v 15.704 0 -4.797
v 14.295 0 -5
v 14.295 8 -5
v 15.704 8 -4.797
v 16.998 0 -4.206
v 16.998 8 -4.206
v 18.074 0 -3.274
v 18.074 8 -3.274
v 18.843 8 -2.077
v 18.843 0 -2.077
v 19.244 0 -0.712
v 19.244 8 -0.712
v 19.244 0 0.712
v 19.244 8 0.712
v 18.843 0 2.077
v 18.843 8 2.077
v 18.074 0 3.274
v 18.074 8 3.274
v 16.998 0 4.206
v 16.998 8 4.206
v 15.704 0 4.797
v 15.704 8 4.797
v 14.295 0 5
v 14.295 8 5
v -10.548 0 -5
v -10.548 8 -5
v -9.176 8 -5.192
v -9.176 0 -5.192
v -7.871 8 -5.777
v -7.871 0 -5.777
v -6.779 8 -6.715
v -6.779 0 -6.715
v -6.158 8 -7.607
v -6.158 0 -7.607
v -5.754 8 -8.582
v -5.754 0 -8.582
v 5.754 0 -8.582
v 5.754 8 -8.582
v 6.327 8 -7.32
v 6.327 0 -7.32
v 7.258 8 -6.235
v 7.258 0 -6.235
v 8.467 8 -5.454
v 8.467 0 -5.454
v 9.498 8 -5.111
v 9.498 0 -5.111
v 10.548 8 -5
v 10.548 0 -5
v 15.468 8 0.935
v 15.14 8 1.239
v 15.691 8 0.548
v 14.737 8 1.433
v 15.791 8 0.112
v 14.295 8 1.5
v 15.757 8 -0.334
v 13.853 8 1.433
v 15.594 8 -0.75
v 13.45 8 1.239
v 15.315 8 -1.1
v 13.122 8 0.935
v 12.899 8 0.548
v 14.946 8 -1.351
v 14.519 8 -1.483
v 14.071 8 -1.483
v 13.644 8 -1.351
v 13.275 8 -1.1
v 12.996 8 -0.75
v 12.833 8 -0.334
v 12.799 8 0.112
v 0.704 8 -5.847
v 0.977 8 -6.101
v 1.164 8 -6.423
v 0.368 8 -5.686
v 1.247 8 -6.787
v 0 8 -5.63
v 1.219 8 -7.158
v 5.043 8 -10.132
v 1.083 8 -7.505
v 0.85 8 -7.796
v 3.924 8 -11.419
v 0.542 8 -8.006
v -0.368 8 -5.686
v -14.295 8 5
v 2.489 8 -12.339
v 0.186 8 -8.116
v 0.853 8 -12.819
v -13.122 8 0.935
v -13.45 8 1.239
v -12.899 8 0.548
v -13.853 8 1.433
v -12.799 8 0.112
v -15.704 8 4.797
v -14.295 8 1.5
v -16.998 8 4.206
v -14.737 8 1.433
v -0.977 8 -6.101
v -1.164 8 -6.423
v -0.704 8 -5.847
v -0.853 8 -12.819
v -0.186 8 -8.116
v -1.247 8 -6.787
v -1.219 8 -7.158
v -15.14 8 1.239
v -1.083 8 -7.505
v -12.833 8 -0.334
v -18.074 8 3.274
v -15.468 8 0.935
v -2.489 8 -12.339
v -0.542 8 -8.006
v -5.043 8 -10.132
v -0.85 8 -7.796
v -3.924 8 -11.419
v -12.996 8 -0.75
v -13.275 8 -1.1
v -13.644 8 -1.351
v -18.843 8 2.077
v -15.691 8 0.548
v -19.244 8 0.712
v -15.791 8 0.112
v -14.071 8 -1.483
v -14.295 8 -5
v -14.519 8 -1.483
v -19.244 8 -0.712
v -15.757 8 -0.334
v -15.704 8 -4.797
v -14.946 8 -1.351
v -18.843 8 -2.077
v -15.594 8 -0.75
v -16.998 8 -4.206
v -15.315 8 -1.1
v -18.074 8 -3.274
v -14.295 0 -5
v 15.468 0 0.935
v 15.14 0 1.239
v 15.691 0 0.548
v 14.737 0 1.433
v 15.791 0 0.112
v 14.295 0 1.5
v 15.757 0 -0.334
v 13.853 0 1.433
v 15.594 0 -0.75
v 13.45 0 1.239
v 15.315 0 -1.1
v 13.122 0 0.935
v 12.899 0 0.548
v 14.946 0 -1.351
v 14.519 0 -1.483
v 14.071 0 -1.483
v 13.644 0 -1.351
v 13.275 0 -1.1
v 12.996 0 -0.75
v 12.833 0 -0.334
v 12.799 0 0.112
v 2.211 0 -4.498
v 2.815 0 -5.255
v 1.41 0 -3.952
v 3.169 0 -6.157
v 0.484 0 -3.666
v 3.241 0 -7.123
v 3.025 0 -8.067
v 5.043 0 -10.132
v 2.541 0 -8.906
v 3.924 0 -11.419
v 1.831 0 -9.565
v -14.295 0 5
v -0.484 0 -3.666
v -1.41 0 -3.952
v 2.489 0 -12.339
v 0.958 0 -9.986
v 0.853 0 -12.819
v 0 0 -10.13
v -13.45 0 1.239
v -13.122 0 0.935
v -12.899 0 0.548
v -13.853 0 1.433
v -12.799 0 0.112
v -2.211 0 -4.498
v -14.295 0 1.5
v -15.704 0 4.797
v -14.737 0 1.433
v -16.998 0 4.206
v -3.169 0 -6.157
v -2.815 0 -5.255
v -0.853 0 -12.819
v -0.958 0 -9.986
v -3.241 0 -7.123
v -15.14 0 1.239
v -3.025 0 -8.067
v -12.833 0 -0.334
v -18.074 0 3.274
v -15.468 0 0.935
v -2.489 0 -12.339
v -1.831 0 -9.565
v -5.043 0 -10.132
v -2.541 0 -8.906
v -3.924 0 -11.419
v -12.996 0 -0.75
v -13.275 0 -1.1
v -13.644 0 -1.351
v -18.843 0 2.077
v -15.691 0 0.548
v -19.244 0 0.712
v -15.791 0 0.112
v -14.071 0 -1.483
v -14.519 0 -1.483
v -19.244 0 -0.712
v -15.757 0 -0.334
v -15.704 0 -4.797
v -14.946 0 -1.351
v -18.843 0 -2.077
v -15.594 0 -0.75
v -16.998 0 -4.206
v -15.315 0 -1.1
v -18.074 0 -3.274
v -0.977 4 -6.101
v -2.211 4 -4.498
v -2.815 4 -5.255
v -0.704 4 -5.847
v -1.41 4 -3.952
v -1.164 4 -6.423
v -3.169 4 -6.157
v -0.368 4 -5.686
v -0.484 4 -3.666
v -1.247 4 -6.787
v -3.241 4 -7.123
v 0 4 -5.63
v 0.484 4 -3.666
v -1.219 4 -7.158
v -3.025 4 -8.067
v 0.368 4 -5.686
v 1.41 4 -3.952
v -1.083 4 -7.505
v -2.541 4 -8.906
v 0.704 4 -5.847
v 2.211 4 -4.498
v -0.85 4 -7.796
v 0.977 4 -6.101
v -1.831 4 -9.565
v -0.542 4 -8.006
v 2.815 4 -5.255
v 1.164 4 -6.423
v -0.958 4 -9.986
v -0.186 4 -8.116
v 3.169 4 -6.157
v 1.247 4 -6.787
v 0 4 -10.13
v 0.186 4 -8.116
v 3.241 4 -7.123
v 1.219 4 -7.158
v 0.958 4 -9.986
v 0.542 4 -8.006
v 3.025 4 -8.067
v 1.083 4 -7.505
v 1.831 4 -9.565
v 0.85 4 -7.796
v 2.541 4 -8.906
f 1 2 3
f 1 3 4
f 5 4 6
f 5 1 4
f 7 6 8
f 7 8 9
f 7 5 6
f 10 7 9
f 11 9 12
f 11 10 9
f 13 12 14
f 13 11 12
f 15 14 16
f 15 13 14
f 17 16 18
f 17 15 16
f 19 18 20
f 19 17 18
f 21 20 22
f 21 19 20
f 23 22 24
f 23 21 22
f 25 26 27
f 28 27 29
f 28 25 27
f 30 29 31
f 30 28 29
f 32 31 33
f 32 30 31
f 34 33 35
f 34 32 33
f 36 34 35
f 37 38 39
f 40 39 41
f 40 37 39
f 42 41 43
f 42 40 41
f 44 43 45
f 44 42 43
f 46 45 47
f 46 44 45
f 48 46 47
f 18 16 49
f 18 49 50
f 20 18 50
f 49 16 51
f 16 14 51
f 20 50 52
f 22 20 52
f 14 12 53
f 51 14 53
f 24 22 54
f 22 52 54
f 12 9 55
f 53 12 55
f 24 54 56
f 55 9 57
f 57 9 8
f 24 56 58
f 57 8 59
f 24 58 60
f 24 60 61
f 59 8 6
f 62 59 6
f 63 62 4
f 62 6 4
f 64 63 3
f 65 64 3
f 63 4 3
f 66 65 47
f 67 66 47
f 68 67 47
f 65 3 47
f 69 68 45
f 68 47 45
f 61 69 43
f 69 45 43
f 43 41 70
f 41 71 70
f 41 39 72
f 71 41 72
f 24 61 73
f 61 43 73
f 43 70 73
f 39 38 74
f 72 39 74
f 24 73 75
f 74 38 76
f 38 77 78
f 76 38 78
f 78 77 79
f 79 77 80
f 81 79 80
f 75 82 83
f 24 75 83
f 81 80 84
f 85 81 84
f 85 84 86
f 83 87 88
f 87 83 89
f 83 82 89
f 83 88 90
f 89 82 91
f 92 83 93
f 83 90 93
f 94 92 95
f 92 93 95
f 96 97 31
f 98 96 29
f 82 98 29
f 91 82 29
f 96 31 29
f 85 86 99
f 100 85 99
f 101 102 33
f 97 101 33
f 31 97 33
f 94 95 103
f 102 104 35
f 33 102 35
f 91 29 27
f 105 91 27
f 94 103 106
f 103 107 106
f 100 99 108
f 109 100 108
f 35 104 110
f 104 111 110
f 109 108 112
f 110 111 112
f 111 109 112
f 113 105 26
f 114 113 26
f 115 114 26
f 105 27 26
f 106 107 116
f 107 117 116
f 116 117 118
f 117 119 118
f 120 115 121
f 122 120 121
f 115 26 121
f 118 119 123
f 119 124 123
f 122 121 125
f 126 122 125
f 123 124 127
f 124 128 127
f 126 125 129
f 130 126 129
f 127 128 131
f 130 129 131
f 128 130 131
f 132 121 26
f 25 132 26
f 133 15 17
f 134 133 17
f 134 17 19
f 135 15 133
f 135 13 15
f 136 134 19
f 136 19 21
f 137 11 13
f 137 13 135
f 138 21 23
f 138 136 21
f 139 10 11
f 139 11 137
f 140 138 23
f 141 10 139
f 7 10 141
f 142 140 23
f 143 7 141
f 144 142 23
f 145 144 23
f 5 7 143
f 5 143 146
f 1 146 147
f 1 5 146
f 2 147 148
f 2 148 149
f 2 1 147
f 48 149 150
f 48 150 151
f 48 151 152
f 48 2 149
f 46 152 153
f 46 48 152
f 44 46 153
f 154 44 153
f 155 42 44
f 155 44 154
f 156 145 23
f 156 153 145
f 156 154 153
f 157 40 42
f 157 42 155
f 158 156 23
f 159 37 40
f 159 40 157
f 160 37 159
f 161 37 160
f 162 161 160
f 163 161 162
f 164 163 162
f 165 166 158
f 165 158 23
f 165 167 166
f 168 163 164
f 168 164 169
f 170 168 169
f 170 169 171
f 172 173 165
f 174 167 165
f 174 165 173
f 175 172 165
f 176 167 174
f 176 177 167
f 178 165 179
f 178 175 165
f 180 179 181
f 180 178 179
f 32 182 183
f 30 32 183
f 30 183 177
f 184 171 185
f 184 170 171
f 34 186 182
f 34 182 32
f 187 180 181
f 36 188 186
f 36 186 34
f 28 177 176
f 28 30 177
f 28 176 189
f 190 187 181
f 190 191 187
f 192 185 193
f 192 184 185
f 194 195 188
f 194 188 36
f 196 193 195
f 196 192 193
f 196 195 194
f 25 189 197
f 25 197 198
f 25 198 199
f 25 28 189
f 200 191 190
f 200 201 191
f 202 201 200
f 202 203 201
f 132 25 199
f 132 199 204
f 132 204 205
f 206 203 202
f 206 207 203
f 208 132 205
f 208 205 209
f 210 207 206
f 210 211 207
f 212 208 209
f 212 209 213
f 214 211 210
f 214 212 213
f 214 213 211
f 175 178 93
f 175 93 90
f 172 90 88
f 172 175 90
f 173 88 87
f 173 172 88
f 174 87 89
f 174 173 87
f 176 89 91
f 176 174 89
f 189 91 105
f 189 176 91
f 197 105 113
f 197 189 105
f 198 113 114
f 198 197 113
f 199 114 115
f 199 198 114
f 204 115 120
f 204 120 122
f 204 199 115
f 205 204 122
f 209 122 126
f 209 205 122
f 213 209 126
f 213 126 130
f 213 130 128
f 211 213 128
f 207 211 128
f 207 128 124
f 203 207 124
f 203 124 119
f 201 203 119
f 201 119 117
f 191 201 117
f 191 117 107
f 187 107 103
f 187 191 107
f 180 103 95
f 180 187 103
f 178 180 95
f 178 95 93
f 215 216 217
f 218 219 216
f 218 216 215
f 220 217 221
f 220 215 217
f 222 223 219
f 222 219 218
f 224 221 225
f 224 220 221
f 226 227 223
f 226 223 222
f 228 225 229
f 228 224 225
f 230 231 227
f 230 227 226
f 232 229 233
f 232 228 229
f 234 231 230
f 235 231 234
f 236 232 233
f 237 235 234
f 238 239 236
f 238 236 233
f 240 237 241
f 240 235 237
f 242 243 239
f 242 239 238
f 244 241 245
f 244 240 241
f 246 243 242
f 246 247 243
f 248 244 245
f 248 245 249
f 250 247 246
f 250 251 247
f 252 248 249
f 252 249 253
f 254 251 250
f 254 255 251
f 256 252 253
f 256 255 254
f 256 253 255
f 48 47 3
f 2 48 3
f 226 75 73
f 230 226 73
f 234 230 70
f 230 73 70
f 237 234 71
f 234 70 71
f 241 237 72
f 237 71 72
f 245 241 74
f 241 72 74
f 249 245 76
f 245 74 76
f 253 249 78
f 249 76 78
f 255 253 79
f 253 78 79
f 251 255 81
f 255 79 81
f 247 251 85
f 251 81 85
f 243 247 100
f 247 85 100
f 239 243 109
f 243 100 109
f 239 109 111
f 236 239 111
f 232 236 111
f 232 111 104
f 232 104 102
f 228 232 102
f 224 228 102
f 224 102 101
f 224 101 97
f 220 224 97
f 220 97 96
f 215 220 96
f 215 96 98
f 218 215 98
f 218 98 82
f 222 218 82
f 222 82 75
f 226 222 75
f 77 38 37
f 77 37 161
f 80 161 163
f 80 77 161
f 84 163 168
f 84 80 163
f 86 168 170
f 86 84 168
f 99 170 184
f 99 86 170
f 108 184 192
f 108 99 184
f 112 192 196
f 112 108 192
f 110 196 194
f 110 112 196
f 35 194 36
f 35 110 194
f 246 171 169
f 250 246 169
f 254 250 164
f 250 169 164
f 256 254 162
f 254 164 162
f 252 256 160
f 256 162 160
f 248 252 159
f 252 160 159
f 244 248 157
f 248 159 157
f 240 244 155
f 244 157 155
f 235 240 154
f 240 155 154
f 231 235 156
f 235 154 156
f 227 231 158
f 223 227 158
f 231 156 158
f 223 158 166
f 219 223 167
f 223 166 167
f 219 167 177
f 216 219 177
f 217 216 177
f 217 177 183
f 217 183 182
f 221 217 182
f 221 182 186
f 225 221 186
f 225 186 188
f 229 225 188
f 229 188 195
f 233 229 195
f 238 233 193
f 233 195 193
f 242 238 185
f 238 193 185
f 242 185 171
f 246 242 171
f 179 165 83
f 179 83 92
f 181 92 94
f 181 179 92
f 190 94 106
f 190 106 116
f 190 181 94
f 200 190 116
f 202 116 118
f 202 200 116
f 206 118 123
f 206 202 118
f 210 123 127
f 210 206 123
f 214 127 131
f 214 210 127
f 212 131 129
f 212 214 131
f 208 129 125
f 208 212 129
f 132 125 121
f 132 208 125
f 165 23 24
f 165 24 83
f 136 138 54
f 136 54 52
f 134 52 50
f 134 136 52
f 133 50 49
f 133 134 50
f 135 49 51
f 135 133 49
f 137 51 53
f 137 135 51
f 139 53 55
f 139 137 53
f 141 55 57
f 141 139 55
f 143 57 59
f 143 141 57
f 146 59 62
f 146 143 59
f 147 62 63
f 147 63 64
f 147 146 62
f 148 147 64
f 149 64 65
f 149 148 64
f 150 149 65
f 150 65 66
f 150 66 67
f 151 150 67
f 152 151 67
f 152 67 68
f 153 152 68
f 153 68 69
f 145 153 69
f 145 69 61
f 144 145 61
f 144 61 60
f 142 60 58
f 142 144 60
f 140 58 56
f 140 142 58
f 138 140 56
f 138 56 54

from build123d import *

# Parameters (mm, degrees)
SKETCH_1_R          = 1.5
EXTRUDE_1_DEPTH     = 8
EXTRUDE_2_DEPTH     = 8
SKETCH_3_R          = 3.25
CUT_EXTRUDE_1_DEPTH = 4
FILLET_1_R          = 5
HOLE_WIZARD_M3_1_D  = 2.5


with BuildPart() as part:
    # 草图1 → 凸台-拉伸1 (new body)
    with BuildSketch(Plane(origin=(0, 0, 0), x_dir=(1, 0, 0), z_dir=(0, 1, 0))):
        with BuildLine():
            Line((-14.295, 5), (14.295, 5))
            ThreePointArc((14.295, 5), (19.295, 0), (14.295, -5))
            Line((14.295, -5), (-14.295, -5))
            ThreePointArc((-14.295, -5), (-19.295, 0), (-14.295, 5))
        make_face()
        with Locations(Location((-14.295, 0, 0), (0, 0, 270))):
            Circle(SKETCH_1_R, mode=Mode.SUBTRACT)
        with Locations(Location((14.295, 0, 0), (0, 0, 270))):
            Circle(SKETCH_1_R, mode=Mode.SUBTRACT)
    extrude(amount=EXTRUDE_1_DEPTH)

    # 草图2 → 凸台-拉伸2 (add)
    with BuildSketch(Plane(origin=(0, 8, 0), x_dir=(1, 0, 0), z_dir=(0, 1, 0))):
        with BuildLine():
            Line((-6, 6.88), (-6, 5))
            Line((-6, 5), (6, 5))
            Line((6, 5), (6, 6.88))
            ThreePointArc((6, 6.88), (0, 12.88), (-6, 6.88))
        make_face()
    extrude(amount=-EXTRUDE_2_DEPTH)

    # 草图3 → 切除-拉伸1 (cut)
    with BuildSketch(Plane.XZ):
        with Locations(Location((0, -6.88, 0), (0, 0, 270))):
            Circle(SKETCH_3_R)
    extrude(amount=-CUT_EXTRUDE_1_DEPTH, mode=Mode.SUBTRACT)

    # 圆角1
    fillet_1_edges = [part.edges().sort_by_distance(p)[0] for p in [
        (-6, 4, -5),
        (6, 4, -5),
    ]]
    fillet(fillet_1_edges, radius=FILLET_1_R)

    # M3 螺纹孔1 (through all)
    with Locations(Plane(origin=(0, 4, -6.88), x_dir=(0, 0, -1), z_dir=(0, -1, 0))):
        with Locations((0, 0)):
            Hole(HOLE_WIZARD_M3_1_D / 2)


solid = part.part
